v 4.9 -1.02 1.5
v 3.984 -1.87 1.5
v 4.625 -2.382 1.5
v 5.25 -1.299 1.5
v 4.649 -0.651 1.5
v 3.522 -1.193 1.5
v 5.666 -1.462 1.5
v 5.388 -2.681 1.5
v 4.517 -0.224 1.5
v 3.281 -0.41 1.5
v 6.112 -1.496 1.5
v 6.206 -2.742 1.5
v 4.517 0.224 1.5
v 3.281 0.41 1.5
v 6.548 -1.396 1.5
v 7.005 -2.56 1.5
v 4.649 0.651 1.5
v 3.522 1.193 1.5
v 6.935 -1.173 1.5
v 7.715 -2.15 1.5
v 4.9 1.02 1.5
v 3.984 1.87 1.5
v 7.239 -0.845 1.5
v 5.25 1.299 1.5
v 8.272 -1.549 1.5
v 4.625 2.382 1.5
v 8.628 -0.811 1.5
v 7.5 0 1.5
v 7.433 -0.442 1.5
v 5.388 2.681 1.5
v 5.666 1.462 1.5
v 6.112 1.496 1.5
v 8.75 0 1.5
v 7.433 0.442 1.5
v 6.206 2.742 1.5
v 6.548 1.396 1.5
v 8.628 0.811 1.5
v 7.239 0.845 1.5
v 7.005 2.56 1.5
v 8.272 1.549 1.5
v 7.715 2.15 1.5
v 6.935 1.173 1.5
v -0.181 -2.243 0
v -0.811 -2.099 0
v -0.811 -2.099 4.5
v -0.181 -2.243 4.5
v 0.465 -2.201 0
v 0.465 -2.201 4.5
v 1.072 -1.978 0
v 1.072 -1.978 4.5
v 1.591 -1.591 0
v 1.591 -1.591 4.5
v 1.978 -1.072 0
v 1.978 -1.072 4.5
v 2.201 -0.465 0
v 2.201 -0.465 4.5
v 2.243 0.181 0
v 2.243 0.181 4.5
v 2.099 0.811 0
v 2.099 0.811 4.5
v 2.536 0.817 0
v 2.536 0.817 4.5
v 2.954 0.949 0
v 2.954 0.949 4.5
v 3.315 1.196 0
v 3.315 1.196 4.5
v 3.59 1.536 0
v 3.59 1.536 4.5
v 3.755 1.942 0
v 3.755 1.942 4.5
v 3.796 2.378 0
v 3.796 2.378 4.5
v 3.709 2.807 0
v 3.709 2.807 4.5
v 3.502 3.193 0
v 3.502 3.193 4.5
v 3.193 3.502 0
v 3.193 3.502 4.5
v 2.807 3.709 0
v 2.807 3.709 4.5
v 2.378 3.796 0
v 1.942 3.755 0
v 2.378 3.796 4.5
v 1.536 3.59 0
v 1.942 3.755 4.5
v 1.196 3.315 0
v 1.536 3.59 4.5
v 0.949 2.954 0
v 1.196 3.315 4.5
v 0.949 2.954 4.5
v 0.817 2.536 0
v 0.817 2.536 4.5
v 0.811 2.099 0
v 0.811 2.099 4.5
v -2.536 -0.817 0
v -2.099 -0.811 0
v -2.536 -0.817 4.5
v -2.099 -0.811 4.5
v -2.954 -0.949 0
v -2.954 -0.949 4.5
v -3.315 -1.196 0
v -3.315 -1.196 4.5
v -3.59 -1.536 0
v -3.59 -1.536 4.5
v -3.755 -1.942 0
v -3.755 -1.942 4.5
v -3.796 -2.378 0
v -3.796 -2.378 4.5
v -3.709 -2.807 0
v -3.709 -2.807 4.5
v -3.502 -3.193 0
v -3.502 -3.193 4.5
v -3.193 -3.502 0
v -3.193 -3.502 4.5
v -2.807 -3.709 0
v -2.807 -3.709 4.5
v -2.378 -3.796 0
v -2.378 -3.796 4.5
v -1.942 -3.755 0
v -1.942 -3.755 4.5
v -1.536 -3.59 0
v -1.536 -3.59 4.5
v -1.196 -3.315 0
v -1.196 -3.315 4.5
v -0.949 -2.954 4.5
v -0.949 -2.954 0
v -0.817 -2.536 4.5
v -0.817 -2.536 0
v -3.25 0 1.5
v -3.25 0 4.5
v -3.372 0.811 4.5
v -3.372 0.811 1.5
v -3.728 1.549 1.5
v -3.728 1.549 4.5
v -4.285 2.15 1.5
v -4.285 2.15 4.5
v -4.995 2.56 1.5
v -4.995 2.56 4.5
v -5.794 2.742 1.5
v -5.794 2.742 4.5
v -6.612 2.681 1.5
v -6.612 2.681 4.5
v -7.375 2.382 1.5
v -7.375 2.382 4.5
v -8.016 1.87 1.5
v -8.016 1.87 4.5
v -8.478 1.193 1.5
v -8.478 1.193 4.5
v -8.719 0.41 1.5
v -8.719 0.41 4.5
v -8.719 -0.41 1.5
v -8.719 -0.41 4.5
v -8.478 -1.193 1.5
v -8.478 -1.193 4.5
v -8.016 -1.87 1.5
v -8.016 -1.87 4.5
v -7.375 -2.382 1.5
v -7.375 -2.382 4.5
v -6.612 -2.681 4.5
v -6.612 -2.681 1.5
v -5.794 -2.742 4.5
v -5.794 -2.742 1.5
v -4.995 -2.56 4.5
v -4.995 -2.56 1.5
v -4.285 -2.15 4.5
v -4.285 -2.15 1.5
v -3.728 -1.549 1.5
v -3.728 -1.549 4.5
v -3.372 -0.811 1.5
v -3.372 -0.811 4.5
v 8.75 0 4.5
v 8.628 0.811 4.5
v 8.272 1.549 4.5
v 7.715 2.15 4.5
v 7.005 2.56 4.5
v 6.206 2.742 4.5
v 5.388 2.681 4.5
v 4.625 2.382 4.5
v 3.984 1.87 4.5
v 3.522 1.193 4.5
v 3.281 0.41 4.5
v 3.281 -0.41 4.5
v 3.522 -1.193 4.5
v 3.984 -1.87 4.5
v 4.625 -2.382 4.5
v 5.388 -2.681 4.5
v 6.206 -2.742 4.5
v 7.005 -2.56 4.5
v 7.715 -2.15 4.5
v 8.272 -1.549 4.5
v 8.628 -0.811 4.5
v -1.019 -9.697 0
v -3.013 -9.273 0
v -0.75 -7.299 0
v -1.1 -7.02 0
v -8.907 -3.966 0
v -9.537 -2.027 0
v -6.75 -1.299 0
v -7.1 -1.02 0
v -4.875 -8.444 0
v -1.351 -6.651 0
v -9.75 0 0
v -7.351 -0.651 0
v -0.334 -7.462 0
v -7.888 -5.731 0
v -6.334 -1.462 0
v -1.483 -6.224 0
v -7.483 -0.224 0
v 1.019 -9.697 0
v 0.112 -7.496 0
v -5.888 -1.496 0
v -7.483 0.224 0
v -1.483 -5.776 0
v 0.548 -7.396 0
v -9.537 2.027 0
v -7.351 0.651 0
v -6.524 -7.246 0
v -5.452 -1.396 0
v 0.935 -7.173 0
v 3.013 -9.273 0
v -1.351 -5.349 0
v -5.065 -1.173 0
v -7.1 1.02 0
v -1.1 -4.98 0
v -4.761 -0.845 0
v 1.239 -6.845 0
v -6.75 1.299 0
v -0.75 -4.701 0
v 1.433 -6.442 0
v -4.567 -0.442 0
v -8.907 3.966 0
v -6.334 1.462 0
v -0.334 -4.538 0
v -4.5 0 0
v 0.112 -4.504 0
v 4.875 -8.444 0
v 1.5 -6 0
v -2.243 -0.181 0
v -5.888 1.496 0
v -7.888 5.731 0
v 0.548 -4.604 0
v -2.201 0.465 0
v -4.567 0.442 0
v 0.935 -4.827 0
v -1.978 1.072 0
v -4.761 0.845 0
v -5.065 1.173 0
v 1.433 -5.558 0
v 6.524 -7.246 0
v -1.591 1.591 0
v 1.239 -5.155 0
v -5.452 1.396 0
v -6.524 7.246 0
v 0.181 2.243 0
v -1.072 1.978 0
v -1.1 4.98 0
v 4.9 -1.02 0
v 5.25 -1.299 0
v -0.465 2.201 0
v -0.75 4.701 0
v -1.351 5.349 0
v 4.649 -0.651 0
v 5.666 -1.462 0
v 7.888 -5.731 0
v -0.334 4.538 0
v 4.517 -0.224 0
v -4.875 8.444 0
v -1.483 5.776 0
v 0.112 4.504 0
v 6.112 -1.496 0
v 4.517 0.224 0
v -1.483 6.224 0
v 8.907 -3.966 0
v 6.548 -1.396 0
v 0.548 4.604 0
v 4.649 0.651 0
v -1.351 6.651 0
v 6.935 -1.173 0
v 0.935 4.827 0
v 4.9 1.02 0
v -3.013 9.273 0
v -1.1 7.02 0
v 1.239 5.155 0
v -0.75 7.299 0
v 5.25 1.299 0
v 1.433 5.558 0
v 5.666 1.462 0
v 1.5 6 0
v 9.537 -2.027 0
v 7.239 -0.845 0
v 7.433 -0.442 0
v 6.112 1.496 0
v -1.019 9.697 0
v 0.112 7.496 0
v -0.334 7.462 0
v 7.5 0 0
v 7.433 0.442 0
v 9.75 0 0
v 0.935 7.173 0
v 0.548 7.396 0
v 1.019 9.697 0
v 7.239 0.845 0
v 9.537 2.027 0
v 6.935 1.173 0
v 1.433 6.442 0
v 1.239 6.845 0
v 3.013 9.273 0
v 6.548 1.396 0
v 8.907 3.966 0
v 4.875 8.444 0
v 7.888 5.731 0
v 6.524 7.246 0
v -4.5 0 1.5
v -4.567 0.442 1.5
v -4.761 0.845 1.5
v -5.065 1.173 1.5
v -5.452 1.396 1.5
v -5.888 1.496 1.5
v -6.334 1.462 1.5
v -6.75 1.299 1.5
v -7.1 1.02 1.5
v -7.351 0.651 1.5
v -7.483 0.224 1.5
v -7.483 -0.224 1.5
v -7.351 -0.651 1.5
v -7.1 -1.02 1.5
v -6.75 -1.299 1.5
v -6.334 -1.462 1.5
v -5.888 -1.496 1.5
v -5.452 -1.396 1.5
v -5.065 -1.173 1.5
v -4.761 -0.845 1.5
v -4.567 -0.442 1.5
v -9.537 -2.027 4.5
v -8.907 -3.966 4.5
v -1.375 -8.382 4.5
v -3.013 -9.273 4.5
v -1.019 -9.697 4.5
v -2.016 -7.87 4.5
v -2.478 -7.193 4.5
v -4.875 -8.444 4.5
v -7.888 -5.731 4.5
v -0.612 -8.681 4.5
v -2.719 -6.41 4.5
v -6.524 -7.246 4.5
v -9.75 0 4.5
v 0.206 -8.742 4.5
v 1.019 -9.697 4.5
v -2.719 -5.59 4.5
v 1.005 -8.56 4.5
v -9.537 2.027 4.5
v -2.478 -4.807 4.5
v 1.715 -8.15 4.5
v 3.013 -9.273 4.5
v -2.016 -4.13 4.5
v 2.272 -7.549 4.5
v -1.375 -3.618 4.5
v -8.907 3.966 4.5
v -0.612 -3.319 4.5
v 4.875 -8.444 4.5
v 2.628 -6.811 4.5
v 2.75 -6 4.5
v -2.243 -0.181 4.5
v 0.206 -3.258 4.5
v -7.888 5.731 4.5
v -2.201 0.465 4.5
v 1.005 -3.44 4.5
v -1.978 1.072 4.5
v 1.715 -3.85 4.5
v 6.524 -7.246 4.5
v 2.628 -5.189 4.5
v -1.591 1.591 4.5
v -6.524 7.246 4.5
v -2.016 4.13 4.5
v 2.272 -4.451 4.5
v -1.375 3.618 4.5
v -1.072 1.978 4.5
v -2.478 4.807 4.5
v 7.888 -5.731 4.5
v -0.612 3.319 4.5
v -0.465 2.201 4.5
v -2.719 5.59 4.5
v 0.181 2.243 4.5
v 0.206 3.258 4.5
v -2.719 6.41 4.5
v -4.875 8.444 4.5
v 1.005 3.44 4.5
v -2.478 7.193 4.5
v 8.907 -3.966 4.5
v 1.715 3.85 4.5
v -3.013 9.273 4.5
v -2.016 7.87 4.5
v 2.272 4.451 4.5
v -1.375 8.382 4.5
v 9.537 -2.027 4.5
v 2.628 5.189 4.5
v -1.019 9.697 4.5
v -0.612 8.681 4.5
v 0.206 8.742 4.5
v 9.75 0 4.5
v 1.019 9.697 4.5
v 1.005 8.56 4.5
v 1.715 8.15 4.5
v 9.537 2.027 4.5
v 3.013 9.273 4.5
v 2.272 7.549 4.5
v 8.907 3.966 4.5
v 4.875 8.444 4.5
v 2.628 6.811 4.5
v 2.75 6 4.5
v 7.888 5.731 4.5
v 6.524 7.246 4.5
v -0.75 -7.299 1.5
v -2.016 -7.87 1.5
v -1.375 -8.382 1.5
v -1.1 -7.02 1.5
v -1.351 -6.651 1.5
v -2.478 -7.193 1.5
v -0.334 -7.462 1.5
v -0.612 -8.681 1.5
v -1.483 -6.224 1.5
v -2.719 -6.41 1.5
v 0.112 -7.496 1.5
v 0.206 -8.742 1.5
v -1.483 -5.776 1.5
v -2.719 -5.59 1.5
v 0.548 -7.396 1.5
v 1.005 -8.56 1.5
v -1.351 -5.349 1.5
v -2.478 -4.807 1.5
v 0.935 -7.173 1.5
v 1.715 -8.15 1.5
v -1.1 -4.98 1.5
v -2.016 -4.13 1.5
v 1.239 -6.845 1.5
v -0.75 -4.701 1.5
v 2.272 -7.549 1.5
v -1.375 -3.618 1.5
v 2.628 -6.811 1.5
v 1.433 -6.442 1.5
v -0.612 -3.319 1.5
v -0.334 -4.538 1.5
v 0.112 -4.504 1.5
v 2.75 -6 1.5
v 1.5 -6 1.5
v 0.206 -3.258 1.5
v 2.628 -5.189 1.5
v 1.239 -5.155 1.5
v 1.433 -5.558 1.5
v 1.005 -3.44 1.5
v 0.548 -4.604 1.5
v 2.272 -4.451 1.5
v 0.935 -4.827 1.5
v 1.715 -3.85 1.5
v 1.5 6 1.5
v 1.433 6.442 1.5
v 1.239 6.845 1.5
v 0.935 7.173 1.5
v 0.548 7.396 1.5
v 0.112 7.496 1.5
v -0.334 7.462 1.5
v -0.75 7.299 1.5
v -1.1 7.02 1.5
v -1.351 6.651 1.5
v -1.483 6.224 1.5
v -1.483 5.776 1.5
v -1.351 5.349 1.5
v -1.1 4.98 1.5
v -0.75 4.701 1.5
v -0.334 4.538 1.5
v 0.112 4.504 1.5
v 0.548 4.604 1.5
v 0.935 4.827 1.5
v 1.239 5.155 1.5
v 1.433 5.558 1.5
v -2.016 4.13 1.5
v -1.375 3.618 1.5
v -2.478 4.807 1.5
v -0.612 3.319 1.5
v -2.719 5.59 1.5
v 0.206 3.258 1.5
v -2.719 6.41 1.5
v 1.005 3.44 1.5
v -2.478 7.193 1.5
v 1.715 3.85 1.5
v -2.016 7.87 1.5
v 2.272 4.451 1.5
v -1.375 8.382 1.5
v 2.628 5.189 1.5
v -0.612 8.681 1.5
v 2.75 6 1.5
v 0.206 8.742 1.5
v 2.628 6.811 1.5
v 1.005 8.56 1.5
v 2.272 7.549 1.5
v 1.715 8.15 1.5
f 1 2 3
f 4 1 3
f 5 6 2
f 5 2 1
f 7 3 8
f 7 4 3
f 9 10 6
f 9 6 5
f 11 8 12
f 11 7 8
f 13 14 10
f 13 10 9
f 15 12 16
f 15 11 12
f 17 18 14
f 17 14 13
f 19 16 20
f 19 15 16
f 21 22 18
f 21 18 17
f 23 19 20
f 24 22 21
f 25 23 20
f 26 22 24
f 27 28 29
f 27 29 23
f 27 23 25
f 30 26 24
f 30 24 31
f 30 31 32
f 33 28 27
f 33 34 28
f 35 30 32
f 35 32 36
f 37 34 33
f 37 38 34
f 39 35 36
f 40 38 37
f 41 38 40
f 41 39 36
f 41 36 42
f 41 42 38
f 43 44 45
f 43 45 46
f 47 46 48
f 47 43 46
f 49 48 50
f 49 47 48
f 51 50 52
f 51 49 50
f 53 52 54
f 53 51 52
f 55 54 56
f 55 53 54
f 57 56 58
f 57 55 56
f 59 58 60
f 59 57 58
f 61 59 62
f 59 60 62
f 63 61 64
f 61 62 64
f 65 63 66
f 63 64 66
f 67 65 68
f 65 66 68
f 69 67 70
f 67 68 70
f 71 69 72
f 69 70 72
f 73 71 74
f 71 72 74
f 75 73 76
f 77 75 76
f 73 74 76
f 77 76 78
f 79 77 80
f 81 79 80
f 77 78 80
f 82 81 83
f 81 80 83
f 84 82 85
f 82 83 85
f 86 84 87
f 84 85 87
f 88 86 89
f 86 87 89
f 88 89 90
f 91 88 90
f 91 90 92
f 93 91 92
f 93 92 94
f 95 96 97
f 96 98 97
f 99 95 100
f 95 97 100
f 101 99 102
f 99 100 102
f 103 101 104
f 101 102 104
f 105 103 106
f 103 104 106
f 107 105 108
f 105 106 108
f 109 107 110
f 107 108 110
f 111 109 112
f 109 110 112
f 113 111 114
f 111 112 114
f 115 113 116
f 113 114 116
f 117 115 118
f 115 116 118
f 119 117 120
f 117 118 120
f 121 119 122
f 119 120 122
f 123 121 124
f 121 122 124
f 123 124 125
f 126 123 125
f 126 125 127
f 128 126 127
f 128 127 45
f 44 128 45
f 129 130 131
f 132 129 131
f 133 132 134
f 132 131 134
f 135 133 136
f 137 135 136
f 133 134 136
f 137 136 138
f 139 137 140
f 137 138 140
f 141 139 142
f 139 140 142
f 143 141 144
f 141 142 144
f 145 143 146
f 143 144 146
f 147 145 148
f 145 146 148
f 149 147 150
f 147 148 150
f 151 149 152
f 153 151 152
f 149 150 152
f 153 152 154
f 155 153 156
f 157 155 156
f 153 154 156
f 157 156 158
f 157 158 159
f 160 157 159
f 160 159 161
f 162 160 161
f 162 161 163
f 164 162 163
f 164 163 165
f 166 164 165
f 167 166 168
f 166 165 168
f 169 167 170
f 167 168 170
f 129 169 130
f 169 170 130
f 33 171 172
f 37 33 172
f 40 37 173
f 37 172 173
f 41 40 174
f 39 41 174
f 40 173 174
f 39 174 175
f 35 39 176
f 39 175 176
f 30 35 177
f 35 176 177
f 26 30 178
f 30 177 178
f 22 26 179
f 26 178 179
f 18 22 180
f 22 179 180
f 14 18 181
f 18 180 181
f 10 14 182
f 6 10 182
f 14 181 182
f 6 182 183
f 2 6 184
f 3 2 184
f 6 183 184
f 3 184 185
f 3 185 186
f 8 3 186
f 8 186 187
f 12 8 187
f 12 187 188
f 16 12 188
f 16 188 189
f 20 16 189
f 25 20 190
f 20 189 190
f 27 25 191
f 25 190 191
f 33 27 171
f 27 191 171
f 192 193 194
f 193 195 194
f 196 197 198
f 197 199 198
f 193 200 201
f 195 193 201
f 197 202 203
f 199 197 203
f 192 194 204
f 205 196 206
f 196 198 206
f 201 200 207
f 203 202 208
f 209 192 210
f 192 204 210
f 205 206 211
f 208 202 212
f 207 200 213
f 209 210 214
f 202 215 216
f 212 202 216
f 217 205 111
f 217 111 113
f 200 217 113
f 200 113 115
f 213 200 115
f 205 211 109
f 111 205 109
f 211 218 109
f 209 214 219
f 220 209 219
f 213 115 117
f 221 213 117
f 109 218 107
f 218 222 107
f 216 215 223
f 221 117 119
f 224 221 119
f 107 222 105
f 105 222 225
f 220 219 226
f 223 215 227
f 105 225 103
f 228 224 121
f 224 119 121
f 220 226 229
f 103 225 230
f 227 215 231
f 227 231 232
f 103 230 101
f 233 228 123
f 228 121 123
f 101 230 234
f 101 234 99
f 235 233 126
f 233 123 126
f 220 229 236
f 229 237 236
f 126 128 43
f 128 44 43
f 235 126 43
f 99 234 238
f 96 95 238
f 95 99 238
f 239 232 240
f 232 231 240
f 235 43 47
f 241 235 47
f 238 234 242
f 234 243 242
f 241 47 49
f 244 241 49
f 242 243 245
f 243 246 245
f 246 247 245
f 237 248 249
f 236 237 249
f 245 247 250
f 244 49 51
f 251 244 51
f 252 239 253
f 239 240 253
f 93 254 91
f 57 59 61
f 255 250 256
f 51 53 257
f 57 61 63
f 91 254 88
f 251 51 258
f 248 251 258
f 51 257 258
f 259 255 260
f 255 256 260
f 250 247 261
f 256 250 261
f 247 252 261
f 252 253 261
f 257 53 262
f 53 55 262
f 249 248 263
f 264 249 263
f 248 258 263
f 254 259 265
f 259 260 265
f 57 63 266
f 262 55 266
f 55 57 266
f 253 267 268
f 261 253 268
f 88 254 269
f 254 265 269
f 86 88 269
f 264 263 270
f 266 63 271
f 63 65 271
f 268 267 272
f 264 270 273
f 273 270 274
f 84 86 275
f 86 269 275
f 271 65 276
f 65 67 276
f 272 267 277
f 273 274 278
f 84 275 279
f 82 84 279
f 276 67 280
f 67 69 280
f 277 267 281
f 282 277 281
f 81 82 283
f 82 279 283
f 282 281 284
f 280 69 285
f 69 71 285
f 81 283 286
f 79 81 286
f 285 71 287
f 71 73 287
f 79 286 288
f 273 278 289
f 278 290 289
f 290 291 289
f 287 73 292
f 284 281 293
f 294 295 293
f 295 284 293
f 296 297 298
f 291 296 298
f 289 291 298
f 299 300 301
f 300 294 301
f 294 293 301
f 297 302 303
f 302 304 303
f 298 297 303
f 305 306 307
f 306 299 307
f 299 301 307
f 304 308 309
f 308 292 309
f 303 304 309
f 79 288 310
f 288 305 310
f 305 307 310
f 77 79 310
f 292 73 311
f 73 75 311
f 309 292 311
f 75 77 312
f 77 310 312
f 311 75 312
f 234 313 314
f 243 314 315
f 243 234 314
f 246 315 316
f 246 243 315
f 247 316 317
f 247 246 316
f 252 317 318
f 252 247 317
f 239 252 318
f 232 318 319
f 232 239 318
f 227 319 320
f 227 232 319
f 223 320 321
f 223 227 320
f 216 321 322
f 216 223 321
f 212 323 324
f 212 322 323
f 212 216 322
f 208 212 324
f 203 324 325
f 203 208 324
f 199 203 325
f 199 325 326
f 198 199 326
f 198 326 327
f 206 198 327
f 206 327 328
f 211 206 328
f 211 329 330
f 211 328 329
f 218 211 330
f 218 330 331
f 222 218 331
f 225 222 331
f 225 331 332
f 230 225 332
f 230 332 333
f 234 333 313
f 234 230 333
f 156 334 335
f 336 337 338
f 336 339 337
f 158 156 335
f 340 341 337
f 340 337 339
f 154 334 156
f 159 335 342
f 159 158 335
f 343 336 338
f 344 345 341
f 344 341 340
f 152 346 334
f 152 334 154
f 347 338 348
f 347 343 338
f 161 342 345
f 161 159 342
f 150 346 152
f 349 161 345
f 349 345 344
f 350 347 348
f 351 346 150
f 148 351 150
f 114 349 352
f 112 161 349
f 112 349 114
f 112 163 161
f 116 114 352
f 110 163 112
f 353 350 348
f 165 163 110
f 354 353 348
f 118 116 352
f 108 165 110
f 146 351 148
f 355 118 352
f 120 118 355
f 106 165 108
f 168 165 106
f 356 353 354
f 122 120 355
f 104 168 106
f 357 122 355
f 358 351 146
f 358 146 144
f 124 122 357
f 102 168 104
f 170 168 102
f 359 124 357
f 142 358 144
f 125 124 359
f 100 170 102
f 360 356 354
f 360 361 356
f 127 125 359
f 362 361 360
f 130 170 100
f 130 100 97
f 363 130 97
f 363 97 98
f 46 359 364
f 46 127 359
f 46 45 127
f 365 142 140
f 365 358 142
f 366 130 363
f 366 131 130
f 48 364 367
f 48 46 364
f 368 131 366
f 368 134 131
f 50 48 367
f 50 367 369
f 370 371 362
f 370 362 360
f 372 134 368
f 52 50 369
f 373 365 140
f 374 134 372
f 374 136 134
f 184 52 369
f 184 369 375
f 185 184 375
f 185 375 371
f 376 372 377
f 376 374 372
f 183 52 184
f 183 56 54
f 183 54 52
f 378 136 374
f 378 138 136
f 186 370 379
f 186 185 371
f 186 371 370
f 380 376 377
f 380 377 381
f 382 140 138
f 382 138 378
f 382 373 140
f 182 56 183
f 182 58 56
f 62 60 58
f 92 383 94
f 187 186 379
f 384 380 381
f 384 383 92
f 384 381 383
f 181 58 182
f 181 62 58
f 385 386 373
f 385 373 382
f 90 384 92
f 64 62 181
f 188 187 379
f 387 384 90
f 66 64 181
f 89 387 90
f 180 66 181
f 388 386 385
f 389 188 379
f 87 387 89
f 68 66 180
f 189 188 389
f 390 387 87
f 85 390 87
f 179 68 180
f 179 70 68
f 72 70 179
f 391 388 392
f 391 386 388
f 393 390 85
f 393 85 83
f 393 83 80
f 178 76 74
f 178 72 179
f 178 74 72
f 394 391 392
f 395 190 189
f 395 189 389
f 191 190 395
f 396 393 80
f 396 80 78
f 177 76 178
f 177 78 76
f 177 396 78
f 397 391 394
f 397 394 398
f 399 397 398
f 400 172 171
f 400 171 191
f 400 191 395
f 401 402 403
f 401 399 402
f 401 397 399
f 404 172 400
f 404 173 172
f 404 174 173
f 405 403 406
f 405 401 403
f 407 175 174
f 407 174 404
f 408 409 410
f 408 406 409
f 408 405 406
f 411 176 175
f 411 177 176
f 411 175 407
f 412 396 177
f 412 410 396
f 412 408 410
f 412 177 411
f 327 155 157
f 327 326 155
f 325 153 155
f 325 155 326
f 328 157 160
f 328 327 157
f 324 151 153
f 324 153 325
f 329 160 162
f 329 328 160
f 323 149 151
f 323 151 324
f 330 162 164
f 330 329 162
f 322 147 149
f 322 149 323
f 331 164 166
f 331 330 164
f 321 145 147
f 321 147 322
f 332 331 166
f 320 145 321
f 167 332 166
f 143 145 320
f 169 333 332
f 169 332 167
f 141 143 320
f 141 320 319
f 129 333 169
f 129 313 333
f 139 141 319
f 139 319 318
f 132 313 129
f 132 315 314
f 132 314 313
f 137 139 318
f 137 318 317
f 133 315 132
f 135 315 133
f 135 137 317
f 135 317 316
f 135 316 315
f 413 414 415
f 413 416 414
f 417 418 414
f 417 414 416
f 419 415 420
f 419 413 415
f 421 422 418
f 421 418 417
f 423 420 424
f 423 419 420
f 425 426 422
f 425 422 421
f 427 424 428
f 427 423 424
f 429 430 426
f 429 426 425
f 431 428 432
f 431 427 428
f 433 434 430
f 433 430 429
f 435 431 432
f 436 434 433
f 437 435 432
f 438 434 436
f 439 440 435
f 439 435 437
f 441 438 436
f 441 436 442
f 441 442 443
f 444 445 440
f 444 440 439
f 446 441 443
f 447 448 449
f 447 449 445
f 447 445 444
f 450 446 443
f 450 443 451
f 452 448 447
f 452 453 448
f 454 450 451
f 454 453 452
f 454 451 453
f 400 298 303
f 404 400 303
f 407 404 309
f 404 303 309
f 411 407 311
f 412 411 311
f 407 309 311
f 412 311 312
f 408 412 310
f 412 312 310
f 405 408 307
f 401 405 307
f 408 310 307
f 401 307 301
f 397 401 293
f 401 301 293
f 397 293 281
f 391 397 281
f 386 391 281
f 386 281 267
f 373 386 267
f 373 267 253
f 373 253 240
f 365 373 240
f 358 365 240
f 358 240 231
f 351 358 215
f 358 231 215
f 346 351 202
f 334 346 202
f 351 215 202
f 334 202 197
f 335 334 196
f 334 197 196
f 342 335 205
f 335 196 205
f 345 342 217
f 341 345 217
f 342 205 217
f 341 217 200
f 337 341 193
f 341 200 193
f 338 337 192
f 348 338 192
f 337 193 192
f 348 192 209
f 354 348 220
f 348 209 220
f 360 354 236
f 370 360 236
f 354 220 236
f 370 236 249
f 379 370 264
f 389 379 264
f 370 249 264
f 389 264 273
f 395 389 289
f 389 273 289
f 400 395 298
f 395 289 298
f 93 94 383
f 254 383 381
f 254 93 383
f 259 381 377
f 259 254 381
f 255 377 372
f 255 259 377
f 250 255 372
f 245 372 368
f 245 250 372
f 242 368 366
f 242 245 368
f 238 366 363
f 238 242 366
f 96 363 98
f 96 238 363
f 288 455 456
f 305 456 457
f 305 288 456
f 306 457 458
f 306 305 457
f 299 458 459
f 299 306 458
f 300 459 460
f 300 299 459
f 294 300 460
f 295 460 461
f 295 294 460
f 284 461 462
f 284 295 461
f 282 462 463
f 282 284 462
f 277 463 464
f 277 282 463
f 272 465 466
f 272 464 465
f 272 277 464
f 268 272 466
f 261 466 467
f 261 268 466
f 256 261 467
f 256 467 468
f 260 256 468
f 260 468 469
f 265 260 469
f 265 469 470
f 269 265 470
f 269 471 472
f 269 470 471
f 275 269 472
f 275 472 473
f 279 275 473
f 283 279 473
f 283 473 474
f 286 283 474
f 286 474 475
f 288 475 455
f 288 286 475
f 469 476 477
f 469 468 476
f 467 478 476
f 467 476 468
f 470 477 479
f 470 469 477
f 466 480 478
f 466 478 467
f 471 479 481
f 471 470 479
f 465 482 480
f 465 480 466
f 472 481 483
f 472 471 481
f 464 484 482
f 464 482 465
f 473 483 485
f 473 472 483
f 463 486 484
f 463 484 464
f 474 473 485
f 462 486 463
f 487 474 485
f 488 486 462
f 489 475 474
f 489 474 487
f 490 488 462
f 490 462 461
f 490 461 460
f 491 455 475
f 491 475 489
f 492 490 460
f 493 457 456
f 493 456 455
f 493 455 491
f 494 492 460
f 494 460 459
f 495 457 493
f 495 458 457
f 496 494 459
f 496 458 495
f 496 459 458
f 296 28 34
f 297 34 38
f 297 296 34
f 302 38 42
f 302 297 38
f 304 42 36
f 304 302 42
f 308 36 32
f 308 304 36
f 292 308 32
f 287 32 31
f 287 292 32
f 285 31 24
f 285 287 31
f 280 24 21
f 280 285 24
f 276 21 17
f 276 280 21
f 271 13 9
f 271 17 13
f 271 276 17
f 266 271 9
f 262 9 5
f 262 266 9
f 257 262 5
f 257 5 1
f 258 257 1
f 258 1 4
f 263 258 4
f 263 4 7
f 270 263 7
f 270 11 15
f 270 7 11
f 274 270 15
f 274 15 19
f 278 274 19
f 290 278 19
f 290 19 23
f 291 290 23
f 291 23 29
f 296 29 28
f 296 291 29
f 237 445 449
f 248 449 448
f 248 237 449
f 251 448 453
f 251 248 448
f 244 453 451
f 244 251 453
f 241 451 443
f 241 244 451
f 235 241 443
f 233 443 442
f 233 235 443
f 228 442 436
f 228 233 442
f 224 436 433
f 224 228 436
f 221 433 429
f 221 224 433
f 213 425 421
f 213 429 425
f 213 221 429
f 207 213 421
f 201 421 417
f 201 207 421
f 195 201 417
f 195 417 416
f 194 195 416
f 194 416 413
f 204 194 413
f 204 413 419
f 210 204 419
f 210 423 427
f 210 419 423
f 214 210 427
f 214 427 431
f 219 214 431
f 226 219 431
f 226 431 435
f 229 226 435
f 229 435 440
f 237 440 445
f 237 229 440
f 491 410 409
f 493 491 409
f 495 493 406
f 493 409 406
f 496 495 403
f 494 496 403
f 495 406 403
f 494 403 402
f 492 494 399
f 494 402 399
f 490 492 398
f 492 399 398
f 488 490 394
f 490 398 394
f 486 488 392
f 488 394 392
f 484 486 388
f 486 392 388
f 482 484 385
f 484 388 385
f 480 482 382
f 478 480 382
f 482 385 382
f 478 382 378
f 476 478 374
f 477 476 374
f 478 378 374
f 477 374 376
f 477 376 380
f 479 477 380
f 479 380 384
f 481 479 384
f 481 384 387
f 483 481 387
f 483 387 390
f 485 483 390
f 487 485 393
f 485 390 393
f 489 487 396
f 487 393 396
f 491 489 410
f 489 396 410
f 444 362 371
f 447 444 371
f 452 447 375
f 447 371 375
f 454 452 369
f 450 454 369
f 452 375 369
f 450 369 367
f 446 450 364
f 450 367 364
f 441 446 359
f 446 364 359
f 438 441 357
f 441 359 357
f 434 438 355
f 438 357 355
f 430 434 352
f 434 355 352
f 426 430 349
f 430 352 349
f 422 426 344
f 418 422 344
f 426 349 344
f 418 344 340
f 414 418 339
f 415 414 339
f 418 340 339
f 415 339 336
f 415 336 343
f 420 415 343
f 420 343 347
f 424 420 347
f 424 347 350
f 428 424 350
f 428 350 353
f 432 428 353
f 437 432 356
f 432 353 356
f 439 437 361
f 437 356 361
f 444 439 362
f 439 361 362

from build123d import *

# Parameters (mm, degrees)
SKETCH1_R           = 9.75
SKETCH1_R_2         = 2.25
SKETCH1_R_3         = 1.5
BOSS_EXTRUDE1_DEPTH = 4.5
SKETCH2_R           = 1.5
CUT_EXTRUDE1_DEPTH  = 15.504309704
SKETCH3_R           = 2.75
CUT_EXTRUDE2_DEPTH  = 3


with BuildPart() as part:
    # Sketch1 → Boss-Extrude1 (new body)
    with BuildSketch(Plane.XY):
        Circle(SKETCH1_R)
        Circle(SKETCH1_R_2, mode=Mode.SUBTRACT)
        with Locations((0, 6)):
            Circle(SKETCH1_R_3, mode=Mode.SUBTRACT)
        with Locations((6, 0)):
            Circle(SKETCH1_R_3, mode=Mode.SUBTRACT)
        with Locations((0, -6)):
            Circle(SKETCH1_R_3, mode=Mode.SUBTRACT)
        with Locations((-6, 0)):
            Circle(SKETCH1_R_3, mode=Mode.SUBTRACT)
    extrude(amount=BOSS_EXTRUDE1_DEPTH)

    # Sketch2 → Cut-Extrude1 (cut, through all)
    with BuildSketch(Plane.XY.offset(4.5)):
        with Locations((2.298097039, 2.298097039)):
            Circle(SKETCH2_R)
        with Locations((-2.298097039, -2.298097039)):
            Circle(SKETCH2_R)
    extrude(amount=-CUT_EXTRUDE1_DEPTH, mode=Mode.SUBTRACT)

    # Sketch3 → Cut-Extrude2 (cut)
    with BuildSketch(Plane.XY.offset(4.5)):
        with Locations((6, 0)):
            Circle(SKETCH3_R)
        with Locations((0, -6)):
            Circle(SKETCH3_R)
        with Locations((-6, 0)):
            Circle(SKETCH3_R)
        with Locations((0, 6)):
            Circle(SKETCH3_R)
    extrude(amount=-CUT_EXTRUDE2_DEPTH, mode=Mode.SUBTRACT)


solid = part.part
